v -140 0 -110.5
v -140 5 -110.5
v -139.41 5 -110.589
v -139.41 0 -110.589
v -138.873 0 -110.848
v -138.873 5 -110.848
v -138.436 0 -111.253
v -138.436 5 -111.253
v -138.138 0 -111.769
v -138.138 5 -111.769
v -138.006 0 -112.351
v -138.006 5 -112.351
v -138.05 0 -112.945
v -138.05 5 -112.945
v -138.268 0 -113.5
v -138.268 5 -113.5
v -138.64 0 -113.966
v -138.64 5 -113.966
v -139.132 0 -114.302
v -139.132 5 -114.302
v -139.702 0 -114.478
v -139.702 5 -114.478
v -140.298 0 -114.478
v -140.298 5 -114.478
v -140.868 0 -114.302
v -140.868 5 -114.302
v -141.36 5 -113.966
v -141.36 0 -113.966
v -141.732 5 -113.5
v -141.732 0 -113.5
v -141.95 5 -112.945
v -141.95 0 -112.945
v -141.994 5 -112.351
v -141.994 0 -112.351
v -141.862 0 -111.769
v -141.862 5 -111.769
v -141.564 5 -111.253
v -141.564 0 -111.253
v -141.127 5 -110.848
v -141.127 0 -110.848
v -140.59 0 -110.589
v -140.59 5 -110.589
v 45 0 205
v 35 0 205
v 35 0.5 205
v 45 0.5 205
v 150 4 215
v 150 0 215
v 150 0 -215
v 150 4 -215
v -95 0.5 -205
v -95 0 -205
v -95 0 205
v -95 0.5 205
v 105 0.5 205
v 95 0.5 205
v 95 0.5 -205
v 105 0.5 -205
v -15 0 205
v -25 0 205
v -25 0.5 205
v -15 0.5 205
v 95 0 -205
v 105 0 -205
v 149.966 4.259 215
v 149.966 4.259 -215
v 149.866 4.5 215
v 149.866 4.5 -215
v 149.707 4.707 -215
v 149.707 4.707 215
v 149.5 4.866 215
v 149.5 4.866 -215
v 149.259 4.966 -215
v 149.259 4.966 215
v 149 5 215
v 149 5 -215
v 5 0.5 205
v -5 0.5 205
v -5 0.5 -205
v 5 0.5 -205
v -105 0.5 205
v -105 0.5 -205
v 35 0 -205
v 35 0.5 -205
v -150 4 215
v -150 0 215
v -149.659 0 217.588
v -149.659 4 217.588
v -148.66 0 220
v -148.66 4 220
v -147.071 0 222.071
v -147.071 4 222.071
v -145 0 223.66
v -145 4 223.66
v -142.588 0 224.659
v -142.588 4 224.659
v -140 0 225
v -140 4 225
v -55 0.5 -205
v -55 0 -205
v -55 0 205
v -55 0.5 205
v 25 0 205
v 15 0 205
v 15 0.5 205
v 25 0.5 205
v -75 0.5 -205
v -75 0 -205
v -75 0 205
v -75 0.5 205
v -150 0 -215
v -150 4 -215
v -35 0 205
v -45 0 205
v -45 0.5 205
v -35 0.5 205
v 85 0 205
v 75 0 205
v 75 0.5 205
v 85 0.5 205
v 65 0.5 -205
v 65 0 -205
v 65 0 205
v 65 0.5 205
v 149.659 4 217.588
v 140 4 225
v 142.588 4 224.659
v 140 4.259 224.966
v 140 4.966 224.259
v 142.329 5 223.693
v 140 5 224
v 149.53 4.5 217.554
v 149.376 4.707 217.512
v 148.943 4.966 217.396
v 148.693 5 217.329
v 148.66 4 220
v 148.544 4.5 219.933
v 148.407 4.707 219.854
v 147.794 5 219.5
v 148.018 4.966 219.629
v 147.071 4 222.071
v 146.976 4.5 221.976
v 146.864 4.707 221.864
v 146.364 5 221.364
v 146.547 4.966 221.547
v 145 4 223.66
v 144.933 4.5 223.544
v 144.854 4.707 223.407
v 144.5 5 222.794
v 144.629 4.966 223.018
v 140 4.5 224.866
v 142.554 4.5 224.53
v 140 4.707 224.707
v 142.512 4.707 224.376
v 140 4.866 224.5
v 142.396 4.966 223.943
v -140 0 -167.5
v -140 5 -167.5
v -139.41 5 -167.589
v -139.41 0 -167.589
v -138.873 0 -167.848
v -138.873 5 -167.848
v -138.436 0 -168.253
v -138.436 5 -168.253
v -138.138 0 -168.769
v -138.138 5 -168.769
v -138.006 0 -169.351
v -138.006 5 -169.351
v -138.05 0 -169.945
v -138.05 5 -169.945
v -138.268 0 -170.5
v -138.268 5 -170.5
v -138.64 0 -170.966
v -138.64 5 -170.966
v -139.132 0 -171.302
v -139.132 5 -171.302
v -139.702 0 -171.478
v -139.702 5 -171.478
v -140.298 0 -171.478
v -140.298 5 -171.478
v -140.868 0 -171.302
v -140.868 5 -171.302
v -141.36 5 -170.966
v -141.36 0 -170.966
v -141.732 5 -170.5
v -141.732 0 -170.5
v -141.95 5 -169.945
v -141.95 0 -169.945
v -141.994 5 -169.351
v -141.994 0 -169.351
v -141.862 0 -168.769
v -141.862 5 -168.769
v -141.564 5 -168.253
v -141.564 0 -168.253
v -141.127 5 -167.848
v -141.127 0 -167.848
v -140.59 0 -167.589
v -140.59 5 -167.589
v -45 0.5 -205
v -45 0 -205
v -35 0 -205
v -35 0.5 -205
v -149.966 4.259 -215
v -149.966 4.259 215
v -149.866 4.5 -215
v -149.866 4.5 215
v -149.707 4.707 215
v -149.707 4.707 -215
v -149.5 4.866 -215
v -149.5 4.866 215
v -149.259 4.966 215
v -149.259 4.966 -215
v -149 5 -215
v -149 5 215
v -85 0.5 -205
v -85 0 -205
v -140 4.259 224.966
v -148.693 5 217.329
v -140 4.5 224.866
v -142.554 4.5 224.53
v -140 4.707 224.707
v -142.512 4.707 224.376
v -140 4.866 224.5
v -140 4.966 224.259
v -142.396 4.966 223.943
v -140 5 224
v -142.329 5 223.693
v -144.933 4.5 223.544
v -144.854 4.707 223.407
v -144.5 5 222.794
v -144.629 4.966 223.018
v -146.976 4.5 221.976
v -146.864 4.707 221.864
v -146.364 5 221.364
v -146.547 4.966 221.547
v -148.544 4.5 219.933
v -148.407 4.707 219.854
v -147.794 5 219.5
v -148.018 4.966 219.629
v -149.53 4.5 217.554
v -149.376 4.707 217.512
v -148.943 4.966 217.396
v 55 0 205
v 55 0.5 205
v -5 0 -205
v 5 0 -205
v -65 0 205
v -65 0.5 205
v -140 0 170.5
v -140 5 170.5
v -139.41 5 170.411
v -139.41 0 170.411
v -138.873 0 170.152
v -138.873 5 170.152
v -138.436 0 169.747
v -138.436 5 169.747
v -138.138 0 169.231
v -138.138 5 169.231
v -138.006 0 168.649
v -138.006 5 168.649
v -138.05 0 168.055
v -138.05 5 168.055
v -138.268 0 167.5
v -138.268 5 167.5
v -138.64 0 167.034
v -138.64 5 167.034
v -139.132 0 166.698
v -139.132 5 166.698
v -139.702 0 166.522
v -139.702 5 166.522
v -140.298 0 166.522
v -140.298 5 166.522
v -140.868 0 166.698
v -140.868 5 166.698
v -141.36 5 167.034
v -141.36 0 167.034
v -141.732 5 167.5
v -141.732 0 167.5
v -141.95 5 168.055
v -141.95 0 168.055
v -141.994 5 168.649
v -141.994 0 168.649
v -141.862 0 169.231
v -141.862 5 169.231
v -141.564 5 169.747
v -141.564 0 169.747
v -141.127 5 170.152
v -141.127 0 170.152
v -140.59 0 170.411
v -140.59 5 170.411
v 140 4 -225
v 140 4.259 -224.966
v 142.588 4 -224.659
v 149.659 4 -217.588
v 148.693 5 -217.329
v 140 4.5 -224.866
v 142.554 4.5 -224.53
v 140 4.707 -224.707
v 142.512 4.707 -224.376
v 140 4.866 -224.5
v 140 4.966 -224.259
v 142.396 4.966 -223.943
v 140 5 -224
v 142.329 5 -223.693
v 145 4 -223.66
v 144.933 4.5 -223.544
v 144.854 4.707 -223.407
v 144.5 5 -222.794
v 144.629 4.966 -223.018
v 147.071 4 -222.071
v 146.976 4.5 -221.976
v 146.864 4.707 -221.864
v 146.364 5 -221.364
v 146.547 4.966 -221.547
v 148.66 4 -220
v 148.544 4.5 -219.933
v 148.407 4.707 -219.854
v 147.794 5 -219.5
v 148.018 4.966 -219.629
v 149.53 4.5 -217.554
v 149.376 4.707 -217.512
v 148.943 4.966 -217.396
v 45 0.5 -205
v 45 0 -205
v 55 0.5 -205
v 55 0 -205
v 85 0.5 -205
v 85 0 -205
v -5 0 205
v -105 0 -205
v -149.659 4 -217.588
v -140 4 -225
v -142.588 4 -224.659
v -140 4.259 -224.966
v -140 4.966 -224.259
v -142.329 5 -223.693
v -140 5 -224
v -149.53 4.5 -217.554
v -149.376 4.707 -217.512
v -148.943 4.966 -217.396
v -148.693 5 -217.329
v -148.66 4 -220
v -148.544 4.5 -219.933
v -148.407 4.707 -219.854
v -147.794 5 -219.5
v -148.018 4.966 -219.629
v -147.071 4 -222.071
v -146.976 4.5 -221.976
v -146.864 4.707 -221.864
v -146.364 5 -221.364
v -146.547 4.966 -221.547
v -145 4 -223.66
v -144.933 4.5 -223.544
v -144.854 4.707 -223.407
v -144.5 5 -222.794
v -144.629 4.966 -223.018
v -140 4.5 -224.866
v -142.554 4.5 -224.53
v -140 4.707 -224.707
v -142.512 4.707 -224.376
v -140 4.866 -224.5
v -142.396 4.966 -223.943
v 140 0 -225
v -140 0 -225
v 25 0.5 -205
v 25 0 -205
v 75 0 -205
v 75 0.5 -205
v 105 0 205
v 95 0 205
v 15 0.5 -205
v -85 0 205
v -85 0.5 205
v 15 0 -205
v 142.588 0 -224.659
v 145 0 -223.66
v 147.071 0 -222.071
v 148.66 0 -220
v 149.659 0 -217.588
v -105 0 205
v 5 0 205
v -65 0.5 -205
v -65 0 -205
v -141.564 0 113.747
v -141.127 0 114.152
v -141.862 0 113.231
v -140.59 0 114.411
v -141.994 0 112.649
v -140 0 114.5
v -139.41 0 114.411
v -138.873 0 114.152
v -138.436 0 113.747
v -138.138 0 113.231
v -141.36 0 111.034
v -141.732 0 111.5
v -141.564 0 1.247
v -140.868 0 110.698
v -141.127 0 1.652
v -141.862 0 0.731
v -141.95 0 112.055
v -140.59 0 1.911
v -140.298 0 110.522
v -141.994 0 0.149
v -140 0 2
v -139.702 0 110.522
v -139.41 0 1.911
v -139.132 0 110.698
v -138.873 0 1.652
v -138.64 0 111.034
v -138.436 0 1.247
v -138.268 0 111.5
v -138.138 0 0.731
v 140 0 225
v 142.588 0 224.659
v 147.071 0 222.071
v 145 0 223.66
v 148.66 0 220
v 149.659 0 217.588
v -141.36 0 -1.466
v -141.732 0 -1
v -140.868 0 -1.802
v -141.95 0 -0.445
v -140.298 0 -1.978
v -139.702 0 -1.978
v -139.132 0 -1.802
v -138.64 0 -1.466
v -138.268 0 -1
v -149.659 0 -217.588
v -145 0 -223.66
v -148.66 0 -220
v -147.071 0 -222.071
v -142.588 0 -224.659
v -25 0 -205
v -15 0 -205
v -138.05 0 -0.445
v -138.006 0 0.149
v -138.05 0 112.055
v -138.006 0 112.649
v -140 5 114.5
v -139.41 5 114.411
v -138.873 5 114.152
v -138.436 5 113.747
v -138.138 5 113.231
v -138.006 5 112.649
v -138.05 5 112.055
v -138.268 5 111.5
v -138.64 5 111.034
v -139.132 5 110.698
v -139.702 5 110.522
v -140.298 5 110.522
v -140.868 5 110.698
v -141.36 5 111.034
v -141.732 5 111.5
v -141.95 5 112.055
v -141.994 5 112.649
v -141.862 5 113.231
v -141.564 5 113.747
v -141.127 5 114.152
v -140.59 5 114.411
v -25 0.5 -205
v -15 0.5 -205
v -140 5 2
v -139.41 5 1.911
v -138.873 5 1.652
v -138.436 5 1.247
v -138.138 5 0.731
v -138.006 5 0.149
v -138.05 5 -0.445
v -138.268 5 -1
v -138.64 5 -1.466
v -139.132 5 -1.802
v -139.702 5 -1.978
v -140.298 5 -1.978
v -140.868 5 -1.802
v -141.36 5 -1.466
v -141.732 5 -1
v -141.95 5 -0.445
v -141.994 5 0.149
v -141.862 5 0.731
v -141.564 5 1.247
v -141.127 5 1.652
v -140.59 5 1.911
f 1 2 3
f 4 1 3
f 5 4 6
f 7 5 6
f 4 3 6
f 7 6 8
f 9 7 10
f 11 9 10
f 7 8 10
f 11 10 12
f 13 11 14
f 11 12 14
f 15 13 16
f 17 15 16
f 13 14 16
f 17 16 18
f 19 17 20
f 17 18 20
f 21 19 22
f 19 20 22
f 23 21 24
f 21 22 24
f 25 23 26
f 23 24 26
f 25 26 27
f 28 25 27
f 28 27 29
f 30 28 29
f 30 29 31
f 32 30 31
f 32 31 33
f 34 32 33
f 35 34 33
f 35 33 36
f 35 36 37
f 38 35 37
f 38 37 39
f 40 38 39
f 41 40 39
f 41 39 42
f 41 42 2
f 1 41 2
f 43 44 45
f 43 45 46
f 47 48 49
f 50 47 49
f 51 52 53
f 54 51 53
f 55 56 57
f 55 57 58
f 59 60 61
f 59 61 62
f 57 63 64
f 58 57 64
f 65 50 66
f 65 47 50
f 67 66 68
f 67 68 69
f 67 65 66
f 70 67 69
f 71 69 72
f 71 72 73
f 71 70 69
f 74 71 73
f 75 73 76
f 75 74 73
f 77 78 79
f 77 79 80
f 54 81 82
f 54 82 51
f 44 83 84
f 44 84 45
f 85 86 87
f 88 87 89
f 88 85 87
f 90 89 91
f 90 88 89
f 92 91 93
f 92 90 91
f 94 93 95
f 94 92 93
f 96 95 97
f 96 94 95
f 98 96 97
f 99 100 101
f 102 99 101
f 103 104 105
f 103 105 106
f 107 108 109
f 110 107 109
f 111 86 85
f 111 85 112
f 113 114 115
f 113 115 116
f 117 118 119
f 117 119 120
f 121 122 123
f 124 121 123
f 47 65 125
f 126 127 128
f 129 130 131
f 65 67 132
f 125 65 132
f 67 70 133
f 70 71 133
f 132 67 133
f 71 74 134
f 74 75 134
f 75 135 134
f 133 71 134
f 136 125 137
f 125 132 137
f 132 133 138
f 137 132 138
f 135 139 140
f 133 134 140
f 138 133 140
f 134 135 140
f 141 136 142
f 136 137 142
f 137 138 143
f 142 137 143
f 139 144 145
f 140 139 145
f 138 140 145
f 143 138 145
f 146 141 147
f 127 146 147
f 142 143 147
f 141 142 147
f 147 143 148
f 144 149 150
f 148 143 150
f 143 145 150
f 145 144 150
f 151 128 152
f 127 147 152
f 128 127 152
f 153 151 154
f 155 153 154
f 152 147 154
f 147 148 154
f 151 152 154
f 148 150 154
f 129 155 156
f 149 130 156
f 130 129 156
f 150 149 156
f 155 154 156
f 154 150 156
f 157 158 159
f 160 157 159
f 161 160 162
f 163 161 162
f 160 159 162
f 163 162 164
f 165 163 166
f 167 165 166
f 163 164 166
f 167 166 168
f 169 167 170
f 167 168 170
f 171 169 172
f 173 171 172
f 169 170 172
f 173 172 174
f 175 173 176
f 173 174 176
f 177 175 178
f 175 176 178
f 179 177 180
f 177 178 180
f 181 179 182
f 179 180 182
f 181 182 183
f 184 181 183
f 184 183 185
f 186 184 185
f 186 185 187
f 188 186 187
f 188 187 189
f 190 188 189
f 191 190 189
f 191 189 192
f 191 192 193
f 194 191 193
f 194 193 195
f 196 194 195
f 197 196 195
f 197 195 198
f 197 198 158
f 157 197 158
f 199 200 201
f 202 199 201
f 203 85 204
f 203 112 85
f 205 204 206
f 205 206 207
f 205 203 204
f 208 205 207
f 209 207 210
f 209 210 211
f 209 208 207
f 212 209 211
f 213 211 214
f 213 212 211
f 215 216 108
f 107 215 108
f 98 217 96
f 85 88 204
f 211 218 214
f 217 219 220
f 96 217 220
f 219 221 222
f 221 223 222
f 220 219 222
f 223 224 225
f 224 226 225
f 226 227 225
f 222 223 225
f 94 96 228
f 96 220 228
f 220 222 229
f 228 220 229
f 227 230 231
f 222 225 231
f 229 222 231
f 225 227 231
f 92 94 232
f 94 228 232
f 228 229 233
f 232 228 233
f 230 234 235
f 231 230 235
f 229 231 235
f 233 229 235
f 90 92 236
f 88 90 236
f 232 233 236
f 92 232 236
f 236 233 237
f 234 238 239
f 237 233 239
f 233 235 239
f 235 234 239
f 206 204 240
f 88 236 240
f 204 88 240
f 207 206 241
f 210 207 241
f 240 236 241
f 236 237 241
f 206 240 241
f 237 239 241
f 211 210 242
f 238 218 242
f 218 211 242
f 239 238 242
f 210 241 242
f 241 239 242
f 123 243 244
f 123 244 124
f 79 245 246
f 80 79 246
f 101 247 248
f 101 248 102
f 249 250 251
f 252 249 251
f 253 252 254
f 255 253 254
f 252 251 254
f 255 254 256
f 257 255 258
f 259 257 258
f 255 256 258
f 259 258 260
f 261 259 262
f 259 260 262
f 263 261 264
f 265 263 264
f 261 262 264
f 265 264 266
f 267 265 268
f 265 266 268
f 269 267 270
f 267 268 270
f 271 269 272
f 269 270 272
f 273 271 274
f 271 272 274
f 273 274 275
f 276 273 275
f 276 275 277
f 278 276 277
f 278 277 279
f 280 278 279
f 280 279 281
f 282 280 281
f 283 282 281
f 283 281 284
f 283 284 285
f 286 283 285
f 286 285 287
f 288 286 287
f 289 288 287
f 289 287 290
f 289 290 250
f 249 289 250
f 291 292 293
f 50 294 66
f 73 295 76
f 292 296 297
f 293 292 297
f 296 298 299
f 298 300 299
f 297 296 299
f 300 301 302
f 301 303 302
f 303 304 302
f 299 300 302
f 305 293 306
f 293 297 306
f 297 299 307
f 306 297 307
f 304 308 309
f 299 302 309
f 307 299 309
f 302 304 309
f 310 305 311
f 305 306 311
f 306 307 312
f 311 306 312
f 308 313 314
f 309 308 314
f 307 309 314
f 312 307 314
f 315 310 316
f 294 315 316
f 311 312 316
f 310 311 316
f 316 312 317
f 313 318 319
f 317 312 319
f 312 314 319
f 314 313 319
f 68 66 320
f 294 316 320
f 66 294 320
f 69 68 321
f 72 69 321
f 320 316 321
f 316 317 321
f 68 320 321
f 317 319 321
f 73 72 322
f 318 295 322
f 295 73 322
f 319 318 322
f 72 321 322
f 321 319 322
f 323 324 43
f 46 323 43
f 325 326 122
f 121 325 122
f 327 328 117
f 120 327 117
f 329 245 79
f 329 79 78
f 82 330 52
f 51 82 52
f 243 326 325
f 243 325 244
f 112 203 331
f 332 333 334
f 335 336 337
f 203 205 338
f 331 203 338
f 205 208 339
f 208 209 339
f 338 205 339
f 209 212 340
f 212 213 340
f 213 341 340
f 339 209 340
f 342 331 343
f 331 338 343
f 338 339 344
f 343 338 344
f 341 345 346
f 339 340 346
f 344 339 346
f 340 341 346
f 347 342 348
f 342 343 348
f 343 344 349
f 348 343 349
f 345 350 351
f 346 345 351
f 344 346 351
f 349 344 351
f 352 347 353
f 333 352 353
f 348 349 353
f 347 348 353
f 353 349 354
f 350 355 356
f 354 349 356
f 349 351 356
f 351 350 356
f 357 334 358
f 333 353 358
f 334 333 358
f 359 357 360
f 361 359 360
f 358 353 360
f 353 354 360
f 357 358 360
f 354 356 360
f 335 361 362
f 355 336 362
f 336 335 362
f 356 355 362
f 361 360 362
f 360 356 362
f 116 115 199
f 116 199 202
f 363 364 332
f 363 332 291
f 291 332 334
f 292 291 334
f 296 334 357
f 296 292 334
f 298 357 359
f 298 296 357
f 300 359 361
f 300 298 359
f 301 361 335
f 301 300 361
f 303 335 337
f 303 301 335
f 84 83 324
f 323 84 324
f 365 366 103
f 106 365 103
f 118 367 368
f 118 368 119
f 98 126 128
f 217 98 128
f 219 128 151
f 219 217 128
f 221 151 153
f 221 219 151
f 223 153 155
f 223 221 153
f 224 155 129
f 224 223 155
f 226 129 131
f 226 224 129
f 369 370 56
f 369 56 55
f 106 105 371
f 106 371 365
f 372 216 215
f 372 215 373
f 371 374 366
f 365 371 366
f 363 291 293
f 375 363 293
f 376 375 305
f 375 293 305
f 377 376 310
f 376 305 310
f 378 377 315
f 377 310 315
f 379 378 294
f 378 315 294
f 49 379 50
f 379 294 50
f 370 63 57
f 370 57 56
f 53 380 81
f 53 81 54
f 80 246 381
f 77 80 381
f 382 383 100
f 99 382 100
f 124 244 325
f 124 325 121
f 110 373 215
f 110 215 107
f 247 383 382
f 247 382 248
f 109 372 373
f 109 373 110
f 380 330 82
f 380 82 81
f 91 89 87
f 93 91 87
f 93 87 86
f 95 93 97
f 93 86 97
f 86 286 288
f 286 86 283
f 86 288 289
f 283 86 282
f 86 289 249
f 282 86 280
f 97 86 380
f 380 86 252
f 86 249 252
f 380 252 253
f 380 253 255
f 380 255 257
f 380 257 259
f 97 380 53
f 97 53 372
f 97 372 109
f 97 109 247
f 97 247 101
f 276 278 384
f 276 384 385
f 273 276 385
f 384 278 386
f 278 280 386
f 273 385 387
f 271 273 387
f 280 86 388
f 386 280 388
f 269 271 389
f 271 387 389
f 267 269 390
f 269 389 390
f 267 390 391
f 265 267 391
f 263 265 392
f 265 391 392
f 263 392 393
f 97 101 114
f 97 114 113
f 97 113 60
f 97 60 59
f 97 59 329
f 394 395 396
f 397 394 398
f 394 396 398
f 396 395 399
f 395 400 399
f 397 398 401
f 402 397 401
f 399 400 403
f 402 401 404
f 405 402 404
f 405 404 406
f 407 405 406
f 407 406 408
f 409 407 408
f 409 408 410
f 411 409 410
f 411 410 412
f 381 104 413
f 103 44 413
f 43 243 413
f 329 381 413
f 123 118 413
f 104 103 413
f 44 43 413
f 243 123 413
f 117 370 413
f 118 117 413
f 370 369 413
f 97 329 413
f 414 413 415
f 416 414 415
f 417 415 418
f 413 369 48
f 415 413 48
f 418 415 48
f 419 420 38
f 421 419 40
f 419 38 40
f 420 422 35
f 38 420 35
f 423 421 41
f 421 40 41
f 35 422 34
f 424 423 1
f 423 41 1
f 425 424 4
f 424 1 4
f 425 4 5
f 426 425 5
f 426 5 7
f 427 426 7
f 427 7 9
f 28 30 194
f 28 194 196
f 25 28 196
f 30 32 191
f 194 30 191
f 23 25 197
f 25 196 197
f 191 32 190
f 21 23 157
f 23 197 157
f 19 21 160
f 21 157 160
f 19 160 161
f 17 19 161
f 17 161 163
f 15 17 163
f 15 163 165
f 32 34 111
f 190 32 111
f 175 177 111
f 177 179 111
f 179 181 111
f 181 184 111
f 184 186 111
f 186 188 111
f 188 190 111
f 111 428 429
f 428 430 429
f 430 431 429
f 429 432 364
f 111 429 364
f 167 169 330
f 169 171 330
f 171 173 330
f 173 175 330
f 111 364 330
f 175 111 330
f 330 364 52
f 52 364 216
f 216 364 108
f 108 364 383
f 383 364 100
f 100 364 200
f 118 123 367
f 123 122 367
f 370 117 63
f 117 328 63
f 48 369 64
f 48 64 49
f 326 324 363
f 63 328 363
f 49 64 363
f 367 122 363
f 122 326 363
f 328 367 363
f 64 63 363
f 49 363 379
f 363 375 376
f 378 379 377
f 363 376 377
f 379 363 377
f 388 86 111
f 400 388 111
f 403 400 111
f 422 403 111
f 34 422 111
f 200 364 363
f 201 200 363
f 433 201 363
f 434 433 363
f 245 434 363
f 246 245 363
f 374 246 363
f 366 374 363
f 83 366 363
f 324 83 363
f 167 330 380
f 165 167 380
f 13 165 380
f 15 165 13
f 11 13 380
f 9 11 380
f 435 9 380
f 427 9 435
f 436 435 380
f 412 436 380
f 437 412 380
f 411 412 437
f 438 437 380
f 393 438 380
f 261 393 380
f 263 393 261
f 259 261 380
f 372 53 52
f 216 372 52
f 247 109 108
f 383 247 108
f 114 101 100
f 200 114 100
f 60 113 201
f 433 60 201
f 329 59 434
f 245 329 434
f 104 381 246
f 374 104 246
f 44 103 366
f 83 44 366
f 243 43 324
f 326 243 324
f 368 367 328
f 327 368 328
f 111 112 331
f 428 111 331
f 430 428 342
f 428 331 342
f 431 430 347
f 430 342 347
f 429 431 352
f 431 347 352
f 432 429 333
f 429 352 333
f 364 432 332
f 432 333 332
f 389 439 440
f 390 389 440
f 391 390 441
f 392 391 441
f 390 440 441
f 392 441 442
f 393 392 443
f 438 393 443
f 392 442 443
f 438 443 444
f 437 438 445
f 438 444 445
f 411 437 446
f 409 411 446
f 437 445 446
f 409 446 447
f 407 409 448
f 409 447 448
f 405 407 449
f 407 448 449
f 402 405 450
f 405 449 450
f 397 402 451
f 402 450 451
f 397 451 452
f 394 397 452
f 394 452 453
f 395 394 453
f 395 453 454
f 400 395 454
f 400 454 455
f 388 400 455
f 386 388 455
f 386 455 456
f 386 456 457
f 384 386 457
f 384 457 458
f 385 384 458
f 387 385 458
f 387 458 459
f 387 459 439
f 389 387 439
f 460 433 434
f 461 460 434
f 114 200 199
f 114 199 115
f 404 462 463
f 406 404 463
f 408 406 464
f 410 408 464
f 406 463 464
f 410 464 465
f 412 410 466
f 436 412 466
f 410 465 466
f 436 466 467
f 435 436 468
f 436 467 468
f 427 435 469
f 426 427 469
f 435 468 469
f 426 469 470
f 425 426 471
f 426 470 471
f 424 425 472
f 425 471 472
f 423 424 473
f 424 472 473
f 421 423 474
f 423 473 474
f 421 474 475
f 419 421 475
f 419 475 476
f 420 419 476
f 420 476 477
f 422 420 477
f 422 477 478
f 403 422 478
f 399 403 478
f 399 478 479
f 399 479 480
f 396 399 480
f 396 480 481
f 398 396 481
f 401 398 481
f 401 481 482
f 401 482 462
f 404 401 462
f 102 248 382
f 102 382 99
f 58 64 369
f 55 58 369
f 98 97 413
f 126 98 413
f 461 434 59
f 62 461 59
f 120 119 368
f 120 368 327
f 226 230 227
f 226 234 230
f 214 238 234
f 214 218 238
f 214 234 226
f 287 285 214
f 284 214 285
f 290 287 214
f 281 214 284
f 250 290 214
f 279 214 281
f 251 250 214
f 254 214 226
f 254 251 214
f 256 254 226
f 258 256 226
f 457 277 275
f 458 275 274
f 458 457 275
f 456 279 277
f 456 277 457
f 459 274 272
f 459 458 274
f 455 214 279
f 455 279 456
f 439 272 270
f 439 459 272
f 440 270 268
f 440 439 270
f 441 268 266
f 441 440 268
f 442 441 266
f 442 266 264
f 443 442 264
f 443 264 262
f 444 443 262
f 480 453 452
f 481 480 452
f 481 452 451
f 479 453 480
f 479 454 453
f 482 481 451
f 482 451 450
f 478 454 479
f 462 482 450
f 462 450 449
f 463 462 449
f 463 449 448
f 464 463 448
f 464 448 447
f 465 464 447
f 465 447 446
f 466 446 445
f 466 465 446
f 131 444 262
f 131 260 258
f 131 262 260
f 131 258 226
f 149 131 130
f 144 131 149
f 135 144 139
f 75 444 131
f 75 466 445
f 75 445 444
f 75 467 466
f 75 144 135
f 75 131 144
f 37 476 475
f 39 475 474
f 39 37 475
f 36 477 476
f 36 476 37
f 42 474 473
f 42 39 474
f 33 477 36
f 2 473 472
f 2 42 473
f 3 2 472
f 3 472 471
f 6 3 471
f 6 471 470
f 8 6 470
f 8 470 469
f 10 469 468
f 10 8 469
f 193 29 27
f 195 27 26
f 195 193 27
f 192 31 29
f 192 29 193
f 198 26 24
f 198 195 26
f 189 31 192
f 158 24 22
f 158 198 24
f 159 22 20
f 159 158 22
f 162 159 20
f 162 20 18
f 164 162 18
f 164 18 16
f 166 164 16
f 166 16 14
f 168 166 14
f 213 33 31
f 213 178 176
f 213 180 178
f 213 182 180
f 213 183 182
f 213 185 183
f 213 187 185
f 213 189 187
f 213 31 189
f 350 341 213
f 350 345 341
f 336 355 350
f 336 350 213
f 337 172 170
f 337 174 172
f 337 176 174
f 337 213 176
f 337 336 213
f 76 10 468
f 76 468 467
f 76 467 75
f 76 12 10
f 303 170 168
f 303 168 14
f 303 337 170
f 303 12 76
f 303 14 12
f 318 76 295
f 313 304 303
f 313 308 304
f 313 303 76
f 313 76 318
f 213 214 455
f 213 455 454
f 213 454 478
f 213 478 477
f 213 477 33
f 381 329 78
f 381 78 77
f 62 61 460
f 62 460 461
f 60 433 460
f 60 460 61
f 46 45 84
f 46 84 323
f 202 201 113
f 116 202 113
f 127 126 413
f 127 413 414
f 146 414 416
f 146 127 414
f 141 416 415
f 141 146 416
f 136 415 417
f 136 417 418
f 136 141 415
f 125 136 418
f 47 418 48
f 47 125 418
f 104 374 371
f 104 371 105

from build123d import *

# Parameters (mm, degrees)
SKETCH1_W           = 300
SKETCH1_H           = 450
BOSS_EXTRUDE1_DEPTH = 5
SKETCH2_R           = 2
CUT_EXTRUDE1_DEPTH  = 271.462566726
FILLET2_R           = 10
FILLET1_R           = 1
SKETCH4_W           = 10
SKETCH4_H           = 410
CUT_EXTRUDE3_DEPTH  = 0.5


with BuildPart() as part:
    # Sketch1 → Boss-Extrude1 (new body)
    with BuildSketch(Plane(origin=(0, 0, 0), x_dir=(1, 0, 0), z_dir=(0, 1, 0))):
        Rectangle(SKETCH1_W, SKETCH1_H)
    extrude(amount=BOSS_EXTRUDE1_DEPTH)

    # Sketch2 → Cut-Extrude1 (cut, through all)
    with BuildSketch(Plane(origin=(0, 5, 0), x_dir=(1, 0, 0), z_dir=(0, 1, 0))):
        with Locations(Location((-140, 0, 0), (0, 0, 270))):
            Circle(SKETCH2_R)
        with Locations(Location((-140, 112.5, 0), (0, 0, 270))):
            Circle(SKETCH2_R)
        with Locations(Location((-140, -112.5, 0), (0, 0, 270))):
            Circle(SKETCH2_R)
        with Locations(Location((-140, 169.5, 0), (0, 0, 270))):
            Circle(SKETCH2_R)
        with Locations(Location((-140, -168.5, 0), (0, 0, 270))):
            Circle(SKETCH2_R)
    extrude(amount=-CUT_EXTRUDE1_DEPTH, mode=Mode.SUBTRACT)

    # Fillet2
    fillet2_edges = [part.edges().sort_by_distance(p)[0] for p in [
        (150, 2.5, 225),
        (-150, 2.5, 225),
        (-150, 2.5, -225),
        (150, 2.5, -225),
    ]]
    fillet(fillet2_edges, radius=FILLET2_R)

    # Fillet1
    fillet1_edges = [part.edges().sort_by_distance(p)[0] for p in [
        (-150, 5, 0),
        (0, 5, -225),
        (150, 5, 0),
        (0, 5, 225),
        (-147.071067812, 5, 222.071067812),
        (147.071067812, 5, 222.071067812),
        (147.071067812, 5, -222.071067812),
        (-147.071067812, 5, -222.071067812),
    ]]
    fillet(fillet1_edges, radius=FILLET1_R)

    # Sketch4 → Cut-Extrude3 (cut)
    with BuildSketch(Plane.XZ):
        with Locations((20, 0)):
            Rectangle(SKETCH4_W, SKETCH4_H)
        Rectangle(SKETCH4_W, SKETCH4_H)
        with Locations((40, 0)):
            Rectangle(SKETCH4_W, SKETCH4_H)
        with Locations((60, 0)):
            Rectangle(SKETCH4_W, SKETCH4_H)
        with Locations((80, 0)):
            Rectangle(SKETCH4_W, SKETCH4_H)
        with Locations((100, 0)):
            Rectangle(SKETCH4_W, SKETCH4_H)
        with Locations((-20, 0)):
            Rectangle(SKETCH4_W, SKETCH4_H)
        with Locations((-40, 0)):
            Rectangle(SKETCH4_W, SKETCH4_H)
        with Locations((-60, 0)):
            Rectangle(SKETCH4_W, SKETCH4_H)
        with Locations((-80, 0)):
            Rectangle(SKETCH4_W, SKETCH4_H)
        with Locations((-100, 0)):
            Rectangle(SKETCH4_W, SKETCH4_H)
    extrude(amount=-CUT_EXTRUDE3_DEPTH, mode=Mode.SUBTRACT)


solid = part.part
